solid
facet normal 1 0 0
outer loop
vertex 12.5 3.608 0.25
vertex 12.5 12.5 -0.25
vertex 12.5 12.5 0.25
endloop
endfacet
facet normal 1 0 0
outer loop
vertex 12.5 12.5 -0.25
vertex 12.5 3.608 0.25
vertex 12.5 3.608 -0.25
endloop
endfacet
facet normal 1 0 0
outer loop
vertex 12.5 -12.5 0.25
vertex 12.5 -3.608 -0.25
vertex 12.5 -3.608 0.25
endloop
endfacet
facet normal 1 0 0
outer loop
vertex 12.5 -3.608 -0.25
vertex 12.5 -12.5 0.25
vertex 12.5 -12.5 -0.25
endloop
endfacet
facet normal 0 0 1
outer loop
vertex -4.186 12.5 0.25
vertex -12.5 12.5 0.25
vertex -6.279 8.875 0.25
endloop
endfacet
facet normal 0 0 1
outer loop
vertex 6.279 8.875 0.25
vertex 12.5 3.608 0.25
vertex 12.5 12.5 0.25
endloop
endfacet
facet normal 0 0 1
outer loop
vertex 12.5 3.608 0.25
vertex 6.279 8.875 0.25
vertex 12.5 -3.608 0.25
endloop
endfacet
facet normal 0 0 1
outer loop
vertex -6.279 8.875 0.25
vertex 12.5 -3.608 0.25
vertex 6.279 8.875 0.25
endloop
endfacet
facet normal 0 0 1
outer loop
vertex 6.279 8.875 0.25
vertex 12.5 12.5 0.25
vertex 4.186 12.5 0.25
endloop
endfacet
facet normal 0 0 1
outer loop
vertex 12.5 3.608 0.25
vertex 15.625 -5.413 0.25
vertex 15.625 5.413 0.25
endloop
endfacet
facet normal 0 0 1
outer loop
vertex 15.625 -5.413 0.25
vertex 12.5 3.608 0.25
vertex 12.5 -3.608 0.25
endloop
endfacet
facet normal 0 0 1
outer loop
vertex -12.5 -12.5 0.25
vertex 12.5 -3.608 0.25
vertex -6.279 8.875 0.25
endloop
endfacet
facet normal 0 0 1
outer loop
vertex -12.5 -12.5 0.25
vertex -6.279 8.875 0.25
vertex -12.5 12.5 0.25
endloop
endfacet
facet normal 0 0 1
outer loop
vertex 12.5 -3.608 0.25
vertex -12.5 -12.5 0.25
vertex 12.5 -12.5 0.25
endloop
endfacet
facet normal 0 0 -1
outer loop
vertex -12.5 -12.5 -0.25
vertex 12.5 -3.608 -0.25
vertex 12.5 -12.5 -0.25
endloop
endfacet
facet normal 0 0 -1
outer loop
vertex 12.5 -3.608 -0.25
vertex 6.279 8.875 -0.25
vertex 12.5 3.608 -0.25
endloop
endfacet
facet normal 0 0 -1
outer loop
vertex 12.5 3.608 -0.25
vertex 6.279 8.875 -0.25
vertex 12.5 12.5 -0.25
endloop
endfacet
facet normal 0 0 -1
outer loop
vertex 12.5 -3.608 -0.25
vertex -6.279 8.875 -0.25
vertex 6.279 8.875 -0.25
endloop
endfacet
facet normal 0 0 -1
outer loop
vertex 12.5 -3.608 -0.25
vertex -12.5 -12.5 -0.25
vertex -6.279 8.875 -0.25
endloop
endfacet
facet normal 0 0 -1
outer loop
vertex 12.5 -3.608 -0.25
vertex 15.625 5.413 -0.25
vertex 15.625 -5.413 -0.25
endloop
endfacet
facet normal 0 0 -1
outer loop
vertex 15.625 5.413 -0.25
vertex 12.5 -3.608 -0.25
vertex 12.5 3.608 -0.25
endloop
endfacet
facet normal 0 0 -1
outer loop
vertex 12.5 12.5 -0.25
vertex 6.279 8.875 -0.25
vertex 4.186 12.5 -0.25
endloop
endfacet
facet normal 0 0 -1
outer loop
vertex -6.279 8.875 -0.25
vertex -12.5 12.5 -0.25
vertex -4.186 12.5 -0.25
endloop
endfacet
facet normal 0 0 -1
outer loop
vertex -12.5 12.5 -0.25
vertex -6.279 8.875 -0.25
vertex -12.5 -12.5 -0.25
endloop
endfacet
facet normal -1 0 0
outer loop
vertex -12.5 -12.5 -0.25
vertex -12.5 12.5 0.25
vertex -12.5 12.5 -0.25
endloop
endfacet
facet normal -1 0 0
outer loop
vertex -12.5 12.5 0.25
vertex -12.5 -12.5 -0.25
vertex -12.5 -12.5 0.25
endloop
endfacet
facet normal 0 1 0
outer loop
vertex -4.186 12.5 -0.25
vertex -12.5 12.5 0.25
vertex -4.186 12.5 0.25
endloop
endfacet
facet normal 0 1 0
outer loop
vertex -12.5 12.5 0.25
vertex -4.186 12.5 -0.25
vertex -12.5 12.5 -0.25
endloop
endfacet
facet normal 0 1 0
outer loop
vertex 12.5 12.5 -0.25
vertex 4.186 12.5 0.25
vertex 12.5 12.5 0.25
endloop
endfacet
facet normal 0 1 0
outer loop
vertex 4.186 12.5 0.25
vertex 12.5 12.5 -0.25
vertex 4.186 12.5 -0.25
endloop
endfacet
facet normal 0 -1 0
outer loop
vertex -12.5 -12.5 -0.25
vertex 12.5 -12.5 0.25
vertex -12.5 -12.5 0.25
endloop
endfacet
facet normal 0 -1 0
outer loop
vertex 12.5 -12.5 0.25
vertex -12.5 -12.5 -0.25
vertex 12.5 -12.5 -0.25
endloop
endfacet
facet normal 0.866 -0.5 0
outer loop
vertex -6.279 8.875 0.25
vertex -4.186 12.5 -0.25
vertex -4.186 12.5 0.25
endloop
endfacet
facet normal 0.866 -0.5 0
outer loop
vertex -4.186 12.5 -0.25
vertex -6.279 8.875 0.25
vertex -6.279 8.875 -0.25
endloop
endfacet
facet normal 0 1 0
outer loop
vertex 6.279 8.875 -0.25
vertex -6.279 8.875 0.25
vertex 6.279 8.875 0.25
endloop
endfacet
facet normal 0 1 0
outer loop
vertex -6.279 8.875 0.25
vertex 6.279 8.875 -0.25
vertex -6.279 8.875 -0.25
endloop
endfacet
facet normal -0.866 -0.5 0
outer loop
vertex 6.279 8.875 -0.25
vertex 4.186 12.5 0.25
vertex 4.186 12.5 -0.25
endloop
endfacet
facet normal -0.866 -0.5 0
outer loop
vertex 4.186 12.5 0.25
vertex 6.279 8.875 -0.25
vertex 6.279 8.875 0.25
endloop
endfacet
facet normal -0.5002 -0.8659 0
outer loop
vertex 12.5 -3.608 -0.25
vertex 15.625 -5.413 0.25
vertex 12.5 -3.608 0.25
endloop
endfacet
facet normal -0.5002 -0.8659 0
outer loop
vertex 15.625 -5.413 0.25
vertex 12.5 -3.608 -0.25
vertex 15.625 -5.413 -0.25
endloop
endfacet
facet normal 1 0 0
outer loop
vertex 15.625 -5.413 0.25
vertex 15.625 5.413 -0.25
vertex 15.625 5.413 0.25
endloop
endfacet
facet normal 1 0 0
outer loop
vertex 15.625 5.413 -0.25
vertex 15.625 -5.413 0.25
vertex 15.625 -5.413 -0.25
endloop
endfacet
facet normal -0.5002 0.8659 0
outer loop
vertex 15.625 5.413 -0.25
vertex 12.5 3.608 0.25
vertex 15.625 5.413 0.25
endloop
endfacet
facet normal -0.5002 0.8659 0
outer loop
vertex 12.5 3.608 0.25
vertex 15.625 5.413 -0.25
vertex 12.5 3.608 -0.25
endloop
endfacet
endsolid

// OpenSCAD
x = 25;
y = 25;
z = 0.5;
d = x/2;

difference(){
    cube([x,y,z],true);

    translate([0,y/2,0])
    rotate(90)
    cylinder(d=d+2,h=z,center=true,$fn=3);
}
translate([x/2,0,0])
rotate(180)
cylinder(d=d,h=z,center=true,$fn=3);
